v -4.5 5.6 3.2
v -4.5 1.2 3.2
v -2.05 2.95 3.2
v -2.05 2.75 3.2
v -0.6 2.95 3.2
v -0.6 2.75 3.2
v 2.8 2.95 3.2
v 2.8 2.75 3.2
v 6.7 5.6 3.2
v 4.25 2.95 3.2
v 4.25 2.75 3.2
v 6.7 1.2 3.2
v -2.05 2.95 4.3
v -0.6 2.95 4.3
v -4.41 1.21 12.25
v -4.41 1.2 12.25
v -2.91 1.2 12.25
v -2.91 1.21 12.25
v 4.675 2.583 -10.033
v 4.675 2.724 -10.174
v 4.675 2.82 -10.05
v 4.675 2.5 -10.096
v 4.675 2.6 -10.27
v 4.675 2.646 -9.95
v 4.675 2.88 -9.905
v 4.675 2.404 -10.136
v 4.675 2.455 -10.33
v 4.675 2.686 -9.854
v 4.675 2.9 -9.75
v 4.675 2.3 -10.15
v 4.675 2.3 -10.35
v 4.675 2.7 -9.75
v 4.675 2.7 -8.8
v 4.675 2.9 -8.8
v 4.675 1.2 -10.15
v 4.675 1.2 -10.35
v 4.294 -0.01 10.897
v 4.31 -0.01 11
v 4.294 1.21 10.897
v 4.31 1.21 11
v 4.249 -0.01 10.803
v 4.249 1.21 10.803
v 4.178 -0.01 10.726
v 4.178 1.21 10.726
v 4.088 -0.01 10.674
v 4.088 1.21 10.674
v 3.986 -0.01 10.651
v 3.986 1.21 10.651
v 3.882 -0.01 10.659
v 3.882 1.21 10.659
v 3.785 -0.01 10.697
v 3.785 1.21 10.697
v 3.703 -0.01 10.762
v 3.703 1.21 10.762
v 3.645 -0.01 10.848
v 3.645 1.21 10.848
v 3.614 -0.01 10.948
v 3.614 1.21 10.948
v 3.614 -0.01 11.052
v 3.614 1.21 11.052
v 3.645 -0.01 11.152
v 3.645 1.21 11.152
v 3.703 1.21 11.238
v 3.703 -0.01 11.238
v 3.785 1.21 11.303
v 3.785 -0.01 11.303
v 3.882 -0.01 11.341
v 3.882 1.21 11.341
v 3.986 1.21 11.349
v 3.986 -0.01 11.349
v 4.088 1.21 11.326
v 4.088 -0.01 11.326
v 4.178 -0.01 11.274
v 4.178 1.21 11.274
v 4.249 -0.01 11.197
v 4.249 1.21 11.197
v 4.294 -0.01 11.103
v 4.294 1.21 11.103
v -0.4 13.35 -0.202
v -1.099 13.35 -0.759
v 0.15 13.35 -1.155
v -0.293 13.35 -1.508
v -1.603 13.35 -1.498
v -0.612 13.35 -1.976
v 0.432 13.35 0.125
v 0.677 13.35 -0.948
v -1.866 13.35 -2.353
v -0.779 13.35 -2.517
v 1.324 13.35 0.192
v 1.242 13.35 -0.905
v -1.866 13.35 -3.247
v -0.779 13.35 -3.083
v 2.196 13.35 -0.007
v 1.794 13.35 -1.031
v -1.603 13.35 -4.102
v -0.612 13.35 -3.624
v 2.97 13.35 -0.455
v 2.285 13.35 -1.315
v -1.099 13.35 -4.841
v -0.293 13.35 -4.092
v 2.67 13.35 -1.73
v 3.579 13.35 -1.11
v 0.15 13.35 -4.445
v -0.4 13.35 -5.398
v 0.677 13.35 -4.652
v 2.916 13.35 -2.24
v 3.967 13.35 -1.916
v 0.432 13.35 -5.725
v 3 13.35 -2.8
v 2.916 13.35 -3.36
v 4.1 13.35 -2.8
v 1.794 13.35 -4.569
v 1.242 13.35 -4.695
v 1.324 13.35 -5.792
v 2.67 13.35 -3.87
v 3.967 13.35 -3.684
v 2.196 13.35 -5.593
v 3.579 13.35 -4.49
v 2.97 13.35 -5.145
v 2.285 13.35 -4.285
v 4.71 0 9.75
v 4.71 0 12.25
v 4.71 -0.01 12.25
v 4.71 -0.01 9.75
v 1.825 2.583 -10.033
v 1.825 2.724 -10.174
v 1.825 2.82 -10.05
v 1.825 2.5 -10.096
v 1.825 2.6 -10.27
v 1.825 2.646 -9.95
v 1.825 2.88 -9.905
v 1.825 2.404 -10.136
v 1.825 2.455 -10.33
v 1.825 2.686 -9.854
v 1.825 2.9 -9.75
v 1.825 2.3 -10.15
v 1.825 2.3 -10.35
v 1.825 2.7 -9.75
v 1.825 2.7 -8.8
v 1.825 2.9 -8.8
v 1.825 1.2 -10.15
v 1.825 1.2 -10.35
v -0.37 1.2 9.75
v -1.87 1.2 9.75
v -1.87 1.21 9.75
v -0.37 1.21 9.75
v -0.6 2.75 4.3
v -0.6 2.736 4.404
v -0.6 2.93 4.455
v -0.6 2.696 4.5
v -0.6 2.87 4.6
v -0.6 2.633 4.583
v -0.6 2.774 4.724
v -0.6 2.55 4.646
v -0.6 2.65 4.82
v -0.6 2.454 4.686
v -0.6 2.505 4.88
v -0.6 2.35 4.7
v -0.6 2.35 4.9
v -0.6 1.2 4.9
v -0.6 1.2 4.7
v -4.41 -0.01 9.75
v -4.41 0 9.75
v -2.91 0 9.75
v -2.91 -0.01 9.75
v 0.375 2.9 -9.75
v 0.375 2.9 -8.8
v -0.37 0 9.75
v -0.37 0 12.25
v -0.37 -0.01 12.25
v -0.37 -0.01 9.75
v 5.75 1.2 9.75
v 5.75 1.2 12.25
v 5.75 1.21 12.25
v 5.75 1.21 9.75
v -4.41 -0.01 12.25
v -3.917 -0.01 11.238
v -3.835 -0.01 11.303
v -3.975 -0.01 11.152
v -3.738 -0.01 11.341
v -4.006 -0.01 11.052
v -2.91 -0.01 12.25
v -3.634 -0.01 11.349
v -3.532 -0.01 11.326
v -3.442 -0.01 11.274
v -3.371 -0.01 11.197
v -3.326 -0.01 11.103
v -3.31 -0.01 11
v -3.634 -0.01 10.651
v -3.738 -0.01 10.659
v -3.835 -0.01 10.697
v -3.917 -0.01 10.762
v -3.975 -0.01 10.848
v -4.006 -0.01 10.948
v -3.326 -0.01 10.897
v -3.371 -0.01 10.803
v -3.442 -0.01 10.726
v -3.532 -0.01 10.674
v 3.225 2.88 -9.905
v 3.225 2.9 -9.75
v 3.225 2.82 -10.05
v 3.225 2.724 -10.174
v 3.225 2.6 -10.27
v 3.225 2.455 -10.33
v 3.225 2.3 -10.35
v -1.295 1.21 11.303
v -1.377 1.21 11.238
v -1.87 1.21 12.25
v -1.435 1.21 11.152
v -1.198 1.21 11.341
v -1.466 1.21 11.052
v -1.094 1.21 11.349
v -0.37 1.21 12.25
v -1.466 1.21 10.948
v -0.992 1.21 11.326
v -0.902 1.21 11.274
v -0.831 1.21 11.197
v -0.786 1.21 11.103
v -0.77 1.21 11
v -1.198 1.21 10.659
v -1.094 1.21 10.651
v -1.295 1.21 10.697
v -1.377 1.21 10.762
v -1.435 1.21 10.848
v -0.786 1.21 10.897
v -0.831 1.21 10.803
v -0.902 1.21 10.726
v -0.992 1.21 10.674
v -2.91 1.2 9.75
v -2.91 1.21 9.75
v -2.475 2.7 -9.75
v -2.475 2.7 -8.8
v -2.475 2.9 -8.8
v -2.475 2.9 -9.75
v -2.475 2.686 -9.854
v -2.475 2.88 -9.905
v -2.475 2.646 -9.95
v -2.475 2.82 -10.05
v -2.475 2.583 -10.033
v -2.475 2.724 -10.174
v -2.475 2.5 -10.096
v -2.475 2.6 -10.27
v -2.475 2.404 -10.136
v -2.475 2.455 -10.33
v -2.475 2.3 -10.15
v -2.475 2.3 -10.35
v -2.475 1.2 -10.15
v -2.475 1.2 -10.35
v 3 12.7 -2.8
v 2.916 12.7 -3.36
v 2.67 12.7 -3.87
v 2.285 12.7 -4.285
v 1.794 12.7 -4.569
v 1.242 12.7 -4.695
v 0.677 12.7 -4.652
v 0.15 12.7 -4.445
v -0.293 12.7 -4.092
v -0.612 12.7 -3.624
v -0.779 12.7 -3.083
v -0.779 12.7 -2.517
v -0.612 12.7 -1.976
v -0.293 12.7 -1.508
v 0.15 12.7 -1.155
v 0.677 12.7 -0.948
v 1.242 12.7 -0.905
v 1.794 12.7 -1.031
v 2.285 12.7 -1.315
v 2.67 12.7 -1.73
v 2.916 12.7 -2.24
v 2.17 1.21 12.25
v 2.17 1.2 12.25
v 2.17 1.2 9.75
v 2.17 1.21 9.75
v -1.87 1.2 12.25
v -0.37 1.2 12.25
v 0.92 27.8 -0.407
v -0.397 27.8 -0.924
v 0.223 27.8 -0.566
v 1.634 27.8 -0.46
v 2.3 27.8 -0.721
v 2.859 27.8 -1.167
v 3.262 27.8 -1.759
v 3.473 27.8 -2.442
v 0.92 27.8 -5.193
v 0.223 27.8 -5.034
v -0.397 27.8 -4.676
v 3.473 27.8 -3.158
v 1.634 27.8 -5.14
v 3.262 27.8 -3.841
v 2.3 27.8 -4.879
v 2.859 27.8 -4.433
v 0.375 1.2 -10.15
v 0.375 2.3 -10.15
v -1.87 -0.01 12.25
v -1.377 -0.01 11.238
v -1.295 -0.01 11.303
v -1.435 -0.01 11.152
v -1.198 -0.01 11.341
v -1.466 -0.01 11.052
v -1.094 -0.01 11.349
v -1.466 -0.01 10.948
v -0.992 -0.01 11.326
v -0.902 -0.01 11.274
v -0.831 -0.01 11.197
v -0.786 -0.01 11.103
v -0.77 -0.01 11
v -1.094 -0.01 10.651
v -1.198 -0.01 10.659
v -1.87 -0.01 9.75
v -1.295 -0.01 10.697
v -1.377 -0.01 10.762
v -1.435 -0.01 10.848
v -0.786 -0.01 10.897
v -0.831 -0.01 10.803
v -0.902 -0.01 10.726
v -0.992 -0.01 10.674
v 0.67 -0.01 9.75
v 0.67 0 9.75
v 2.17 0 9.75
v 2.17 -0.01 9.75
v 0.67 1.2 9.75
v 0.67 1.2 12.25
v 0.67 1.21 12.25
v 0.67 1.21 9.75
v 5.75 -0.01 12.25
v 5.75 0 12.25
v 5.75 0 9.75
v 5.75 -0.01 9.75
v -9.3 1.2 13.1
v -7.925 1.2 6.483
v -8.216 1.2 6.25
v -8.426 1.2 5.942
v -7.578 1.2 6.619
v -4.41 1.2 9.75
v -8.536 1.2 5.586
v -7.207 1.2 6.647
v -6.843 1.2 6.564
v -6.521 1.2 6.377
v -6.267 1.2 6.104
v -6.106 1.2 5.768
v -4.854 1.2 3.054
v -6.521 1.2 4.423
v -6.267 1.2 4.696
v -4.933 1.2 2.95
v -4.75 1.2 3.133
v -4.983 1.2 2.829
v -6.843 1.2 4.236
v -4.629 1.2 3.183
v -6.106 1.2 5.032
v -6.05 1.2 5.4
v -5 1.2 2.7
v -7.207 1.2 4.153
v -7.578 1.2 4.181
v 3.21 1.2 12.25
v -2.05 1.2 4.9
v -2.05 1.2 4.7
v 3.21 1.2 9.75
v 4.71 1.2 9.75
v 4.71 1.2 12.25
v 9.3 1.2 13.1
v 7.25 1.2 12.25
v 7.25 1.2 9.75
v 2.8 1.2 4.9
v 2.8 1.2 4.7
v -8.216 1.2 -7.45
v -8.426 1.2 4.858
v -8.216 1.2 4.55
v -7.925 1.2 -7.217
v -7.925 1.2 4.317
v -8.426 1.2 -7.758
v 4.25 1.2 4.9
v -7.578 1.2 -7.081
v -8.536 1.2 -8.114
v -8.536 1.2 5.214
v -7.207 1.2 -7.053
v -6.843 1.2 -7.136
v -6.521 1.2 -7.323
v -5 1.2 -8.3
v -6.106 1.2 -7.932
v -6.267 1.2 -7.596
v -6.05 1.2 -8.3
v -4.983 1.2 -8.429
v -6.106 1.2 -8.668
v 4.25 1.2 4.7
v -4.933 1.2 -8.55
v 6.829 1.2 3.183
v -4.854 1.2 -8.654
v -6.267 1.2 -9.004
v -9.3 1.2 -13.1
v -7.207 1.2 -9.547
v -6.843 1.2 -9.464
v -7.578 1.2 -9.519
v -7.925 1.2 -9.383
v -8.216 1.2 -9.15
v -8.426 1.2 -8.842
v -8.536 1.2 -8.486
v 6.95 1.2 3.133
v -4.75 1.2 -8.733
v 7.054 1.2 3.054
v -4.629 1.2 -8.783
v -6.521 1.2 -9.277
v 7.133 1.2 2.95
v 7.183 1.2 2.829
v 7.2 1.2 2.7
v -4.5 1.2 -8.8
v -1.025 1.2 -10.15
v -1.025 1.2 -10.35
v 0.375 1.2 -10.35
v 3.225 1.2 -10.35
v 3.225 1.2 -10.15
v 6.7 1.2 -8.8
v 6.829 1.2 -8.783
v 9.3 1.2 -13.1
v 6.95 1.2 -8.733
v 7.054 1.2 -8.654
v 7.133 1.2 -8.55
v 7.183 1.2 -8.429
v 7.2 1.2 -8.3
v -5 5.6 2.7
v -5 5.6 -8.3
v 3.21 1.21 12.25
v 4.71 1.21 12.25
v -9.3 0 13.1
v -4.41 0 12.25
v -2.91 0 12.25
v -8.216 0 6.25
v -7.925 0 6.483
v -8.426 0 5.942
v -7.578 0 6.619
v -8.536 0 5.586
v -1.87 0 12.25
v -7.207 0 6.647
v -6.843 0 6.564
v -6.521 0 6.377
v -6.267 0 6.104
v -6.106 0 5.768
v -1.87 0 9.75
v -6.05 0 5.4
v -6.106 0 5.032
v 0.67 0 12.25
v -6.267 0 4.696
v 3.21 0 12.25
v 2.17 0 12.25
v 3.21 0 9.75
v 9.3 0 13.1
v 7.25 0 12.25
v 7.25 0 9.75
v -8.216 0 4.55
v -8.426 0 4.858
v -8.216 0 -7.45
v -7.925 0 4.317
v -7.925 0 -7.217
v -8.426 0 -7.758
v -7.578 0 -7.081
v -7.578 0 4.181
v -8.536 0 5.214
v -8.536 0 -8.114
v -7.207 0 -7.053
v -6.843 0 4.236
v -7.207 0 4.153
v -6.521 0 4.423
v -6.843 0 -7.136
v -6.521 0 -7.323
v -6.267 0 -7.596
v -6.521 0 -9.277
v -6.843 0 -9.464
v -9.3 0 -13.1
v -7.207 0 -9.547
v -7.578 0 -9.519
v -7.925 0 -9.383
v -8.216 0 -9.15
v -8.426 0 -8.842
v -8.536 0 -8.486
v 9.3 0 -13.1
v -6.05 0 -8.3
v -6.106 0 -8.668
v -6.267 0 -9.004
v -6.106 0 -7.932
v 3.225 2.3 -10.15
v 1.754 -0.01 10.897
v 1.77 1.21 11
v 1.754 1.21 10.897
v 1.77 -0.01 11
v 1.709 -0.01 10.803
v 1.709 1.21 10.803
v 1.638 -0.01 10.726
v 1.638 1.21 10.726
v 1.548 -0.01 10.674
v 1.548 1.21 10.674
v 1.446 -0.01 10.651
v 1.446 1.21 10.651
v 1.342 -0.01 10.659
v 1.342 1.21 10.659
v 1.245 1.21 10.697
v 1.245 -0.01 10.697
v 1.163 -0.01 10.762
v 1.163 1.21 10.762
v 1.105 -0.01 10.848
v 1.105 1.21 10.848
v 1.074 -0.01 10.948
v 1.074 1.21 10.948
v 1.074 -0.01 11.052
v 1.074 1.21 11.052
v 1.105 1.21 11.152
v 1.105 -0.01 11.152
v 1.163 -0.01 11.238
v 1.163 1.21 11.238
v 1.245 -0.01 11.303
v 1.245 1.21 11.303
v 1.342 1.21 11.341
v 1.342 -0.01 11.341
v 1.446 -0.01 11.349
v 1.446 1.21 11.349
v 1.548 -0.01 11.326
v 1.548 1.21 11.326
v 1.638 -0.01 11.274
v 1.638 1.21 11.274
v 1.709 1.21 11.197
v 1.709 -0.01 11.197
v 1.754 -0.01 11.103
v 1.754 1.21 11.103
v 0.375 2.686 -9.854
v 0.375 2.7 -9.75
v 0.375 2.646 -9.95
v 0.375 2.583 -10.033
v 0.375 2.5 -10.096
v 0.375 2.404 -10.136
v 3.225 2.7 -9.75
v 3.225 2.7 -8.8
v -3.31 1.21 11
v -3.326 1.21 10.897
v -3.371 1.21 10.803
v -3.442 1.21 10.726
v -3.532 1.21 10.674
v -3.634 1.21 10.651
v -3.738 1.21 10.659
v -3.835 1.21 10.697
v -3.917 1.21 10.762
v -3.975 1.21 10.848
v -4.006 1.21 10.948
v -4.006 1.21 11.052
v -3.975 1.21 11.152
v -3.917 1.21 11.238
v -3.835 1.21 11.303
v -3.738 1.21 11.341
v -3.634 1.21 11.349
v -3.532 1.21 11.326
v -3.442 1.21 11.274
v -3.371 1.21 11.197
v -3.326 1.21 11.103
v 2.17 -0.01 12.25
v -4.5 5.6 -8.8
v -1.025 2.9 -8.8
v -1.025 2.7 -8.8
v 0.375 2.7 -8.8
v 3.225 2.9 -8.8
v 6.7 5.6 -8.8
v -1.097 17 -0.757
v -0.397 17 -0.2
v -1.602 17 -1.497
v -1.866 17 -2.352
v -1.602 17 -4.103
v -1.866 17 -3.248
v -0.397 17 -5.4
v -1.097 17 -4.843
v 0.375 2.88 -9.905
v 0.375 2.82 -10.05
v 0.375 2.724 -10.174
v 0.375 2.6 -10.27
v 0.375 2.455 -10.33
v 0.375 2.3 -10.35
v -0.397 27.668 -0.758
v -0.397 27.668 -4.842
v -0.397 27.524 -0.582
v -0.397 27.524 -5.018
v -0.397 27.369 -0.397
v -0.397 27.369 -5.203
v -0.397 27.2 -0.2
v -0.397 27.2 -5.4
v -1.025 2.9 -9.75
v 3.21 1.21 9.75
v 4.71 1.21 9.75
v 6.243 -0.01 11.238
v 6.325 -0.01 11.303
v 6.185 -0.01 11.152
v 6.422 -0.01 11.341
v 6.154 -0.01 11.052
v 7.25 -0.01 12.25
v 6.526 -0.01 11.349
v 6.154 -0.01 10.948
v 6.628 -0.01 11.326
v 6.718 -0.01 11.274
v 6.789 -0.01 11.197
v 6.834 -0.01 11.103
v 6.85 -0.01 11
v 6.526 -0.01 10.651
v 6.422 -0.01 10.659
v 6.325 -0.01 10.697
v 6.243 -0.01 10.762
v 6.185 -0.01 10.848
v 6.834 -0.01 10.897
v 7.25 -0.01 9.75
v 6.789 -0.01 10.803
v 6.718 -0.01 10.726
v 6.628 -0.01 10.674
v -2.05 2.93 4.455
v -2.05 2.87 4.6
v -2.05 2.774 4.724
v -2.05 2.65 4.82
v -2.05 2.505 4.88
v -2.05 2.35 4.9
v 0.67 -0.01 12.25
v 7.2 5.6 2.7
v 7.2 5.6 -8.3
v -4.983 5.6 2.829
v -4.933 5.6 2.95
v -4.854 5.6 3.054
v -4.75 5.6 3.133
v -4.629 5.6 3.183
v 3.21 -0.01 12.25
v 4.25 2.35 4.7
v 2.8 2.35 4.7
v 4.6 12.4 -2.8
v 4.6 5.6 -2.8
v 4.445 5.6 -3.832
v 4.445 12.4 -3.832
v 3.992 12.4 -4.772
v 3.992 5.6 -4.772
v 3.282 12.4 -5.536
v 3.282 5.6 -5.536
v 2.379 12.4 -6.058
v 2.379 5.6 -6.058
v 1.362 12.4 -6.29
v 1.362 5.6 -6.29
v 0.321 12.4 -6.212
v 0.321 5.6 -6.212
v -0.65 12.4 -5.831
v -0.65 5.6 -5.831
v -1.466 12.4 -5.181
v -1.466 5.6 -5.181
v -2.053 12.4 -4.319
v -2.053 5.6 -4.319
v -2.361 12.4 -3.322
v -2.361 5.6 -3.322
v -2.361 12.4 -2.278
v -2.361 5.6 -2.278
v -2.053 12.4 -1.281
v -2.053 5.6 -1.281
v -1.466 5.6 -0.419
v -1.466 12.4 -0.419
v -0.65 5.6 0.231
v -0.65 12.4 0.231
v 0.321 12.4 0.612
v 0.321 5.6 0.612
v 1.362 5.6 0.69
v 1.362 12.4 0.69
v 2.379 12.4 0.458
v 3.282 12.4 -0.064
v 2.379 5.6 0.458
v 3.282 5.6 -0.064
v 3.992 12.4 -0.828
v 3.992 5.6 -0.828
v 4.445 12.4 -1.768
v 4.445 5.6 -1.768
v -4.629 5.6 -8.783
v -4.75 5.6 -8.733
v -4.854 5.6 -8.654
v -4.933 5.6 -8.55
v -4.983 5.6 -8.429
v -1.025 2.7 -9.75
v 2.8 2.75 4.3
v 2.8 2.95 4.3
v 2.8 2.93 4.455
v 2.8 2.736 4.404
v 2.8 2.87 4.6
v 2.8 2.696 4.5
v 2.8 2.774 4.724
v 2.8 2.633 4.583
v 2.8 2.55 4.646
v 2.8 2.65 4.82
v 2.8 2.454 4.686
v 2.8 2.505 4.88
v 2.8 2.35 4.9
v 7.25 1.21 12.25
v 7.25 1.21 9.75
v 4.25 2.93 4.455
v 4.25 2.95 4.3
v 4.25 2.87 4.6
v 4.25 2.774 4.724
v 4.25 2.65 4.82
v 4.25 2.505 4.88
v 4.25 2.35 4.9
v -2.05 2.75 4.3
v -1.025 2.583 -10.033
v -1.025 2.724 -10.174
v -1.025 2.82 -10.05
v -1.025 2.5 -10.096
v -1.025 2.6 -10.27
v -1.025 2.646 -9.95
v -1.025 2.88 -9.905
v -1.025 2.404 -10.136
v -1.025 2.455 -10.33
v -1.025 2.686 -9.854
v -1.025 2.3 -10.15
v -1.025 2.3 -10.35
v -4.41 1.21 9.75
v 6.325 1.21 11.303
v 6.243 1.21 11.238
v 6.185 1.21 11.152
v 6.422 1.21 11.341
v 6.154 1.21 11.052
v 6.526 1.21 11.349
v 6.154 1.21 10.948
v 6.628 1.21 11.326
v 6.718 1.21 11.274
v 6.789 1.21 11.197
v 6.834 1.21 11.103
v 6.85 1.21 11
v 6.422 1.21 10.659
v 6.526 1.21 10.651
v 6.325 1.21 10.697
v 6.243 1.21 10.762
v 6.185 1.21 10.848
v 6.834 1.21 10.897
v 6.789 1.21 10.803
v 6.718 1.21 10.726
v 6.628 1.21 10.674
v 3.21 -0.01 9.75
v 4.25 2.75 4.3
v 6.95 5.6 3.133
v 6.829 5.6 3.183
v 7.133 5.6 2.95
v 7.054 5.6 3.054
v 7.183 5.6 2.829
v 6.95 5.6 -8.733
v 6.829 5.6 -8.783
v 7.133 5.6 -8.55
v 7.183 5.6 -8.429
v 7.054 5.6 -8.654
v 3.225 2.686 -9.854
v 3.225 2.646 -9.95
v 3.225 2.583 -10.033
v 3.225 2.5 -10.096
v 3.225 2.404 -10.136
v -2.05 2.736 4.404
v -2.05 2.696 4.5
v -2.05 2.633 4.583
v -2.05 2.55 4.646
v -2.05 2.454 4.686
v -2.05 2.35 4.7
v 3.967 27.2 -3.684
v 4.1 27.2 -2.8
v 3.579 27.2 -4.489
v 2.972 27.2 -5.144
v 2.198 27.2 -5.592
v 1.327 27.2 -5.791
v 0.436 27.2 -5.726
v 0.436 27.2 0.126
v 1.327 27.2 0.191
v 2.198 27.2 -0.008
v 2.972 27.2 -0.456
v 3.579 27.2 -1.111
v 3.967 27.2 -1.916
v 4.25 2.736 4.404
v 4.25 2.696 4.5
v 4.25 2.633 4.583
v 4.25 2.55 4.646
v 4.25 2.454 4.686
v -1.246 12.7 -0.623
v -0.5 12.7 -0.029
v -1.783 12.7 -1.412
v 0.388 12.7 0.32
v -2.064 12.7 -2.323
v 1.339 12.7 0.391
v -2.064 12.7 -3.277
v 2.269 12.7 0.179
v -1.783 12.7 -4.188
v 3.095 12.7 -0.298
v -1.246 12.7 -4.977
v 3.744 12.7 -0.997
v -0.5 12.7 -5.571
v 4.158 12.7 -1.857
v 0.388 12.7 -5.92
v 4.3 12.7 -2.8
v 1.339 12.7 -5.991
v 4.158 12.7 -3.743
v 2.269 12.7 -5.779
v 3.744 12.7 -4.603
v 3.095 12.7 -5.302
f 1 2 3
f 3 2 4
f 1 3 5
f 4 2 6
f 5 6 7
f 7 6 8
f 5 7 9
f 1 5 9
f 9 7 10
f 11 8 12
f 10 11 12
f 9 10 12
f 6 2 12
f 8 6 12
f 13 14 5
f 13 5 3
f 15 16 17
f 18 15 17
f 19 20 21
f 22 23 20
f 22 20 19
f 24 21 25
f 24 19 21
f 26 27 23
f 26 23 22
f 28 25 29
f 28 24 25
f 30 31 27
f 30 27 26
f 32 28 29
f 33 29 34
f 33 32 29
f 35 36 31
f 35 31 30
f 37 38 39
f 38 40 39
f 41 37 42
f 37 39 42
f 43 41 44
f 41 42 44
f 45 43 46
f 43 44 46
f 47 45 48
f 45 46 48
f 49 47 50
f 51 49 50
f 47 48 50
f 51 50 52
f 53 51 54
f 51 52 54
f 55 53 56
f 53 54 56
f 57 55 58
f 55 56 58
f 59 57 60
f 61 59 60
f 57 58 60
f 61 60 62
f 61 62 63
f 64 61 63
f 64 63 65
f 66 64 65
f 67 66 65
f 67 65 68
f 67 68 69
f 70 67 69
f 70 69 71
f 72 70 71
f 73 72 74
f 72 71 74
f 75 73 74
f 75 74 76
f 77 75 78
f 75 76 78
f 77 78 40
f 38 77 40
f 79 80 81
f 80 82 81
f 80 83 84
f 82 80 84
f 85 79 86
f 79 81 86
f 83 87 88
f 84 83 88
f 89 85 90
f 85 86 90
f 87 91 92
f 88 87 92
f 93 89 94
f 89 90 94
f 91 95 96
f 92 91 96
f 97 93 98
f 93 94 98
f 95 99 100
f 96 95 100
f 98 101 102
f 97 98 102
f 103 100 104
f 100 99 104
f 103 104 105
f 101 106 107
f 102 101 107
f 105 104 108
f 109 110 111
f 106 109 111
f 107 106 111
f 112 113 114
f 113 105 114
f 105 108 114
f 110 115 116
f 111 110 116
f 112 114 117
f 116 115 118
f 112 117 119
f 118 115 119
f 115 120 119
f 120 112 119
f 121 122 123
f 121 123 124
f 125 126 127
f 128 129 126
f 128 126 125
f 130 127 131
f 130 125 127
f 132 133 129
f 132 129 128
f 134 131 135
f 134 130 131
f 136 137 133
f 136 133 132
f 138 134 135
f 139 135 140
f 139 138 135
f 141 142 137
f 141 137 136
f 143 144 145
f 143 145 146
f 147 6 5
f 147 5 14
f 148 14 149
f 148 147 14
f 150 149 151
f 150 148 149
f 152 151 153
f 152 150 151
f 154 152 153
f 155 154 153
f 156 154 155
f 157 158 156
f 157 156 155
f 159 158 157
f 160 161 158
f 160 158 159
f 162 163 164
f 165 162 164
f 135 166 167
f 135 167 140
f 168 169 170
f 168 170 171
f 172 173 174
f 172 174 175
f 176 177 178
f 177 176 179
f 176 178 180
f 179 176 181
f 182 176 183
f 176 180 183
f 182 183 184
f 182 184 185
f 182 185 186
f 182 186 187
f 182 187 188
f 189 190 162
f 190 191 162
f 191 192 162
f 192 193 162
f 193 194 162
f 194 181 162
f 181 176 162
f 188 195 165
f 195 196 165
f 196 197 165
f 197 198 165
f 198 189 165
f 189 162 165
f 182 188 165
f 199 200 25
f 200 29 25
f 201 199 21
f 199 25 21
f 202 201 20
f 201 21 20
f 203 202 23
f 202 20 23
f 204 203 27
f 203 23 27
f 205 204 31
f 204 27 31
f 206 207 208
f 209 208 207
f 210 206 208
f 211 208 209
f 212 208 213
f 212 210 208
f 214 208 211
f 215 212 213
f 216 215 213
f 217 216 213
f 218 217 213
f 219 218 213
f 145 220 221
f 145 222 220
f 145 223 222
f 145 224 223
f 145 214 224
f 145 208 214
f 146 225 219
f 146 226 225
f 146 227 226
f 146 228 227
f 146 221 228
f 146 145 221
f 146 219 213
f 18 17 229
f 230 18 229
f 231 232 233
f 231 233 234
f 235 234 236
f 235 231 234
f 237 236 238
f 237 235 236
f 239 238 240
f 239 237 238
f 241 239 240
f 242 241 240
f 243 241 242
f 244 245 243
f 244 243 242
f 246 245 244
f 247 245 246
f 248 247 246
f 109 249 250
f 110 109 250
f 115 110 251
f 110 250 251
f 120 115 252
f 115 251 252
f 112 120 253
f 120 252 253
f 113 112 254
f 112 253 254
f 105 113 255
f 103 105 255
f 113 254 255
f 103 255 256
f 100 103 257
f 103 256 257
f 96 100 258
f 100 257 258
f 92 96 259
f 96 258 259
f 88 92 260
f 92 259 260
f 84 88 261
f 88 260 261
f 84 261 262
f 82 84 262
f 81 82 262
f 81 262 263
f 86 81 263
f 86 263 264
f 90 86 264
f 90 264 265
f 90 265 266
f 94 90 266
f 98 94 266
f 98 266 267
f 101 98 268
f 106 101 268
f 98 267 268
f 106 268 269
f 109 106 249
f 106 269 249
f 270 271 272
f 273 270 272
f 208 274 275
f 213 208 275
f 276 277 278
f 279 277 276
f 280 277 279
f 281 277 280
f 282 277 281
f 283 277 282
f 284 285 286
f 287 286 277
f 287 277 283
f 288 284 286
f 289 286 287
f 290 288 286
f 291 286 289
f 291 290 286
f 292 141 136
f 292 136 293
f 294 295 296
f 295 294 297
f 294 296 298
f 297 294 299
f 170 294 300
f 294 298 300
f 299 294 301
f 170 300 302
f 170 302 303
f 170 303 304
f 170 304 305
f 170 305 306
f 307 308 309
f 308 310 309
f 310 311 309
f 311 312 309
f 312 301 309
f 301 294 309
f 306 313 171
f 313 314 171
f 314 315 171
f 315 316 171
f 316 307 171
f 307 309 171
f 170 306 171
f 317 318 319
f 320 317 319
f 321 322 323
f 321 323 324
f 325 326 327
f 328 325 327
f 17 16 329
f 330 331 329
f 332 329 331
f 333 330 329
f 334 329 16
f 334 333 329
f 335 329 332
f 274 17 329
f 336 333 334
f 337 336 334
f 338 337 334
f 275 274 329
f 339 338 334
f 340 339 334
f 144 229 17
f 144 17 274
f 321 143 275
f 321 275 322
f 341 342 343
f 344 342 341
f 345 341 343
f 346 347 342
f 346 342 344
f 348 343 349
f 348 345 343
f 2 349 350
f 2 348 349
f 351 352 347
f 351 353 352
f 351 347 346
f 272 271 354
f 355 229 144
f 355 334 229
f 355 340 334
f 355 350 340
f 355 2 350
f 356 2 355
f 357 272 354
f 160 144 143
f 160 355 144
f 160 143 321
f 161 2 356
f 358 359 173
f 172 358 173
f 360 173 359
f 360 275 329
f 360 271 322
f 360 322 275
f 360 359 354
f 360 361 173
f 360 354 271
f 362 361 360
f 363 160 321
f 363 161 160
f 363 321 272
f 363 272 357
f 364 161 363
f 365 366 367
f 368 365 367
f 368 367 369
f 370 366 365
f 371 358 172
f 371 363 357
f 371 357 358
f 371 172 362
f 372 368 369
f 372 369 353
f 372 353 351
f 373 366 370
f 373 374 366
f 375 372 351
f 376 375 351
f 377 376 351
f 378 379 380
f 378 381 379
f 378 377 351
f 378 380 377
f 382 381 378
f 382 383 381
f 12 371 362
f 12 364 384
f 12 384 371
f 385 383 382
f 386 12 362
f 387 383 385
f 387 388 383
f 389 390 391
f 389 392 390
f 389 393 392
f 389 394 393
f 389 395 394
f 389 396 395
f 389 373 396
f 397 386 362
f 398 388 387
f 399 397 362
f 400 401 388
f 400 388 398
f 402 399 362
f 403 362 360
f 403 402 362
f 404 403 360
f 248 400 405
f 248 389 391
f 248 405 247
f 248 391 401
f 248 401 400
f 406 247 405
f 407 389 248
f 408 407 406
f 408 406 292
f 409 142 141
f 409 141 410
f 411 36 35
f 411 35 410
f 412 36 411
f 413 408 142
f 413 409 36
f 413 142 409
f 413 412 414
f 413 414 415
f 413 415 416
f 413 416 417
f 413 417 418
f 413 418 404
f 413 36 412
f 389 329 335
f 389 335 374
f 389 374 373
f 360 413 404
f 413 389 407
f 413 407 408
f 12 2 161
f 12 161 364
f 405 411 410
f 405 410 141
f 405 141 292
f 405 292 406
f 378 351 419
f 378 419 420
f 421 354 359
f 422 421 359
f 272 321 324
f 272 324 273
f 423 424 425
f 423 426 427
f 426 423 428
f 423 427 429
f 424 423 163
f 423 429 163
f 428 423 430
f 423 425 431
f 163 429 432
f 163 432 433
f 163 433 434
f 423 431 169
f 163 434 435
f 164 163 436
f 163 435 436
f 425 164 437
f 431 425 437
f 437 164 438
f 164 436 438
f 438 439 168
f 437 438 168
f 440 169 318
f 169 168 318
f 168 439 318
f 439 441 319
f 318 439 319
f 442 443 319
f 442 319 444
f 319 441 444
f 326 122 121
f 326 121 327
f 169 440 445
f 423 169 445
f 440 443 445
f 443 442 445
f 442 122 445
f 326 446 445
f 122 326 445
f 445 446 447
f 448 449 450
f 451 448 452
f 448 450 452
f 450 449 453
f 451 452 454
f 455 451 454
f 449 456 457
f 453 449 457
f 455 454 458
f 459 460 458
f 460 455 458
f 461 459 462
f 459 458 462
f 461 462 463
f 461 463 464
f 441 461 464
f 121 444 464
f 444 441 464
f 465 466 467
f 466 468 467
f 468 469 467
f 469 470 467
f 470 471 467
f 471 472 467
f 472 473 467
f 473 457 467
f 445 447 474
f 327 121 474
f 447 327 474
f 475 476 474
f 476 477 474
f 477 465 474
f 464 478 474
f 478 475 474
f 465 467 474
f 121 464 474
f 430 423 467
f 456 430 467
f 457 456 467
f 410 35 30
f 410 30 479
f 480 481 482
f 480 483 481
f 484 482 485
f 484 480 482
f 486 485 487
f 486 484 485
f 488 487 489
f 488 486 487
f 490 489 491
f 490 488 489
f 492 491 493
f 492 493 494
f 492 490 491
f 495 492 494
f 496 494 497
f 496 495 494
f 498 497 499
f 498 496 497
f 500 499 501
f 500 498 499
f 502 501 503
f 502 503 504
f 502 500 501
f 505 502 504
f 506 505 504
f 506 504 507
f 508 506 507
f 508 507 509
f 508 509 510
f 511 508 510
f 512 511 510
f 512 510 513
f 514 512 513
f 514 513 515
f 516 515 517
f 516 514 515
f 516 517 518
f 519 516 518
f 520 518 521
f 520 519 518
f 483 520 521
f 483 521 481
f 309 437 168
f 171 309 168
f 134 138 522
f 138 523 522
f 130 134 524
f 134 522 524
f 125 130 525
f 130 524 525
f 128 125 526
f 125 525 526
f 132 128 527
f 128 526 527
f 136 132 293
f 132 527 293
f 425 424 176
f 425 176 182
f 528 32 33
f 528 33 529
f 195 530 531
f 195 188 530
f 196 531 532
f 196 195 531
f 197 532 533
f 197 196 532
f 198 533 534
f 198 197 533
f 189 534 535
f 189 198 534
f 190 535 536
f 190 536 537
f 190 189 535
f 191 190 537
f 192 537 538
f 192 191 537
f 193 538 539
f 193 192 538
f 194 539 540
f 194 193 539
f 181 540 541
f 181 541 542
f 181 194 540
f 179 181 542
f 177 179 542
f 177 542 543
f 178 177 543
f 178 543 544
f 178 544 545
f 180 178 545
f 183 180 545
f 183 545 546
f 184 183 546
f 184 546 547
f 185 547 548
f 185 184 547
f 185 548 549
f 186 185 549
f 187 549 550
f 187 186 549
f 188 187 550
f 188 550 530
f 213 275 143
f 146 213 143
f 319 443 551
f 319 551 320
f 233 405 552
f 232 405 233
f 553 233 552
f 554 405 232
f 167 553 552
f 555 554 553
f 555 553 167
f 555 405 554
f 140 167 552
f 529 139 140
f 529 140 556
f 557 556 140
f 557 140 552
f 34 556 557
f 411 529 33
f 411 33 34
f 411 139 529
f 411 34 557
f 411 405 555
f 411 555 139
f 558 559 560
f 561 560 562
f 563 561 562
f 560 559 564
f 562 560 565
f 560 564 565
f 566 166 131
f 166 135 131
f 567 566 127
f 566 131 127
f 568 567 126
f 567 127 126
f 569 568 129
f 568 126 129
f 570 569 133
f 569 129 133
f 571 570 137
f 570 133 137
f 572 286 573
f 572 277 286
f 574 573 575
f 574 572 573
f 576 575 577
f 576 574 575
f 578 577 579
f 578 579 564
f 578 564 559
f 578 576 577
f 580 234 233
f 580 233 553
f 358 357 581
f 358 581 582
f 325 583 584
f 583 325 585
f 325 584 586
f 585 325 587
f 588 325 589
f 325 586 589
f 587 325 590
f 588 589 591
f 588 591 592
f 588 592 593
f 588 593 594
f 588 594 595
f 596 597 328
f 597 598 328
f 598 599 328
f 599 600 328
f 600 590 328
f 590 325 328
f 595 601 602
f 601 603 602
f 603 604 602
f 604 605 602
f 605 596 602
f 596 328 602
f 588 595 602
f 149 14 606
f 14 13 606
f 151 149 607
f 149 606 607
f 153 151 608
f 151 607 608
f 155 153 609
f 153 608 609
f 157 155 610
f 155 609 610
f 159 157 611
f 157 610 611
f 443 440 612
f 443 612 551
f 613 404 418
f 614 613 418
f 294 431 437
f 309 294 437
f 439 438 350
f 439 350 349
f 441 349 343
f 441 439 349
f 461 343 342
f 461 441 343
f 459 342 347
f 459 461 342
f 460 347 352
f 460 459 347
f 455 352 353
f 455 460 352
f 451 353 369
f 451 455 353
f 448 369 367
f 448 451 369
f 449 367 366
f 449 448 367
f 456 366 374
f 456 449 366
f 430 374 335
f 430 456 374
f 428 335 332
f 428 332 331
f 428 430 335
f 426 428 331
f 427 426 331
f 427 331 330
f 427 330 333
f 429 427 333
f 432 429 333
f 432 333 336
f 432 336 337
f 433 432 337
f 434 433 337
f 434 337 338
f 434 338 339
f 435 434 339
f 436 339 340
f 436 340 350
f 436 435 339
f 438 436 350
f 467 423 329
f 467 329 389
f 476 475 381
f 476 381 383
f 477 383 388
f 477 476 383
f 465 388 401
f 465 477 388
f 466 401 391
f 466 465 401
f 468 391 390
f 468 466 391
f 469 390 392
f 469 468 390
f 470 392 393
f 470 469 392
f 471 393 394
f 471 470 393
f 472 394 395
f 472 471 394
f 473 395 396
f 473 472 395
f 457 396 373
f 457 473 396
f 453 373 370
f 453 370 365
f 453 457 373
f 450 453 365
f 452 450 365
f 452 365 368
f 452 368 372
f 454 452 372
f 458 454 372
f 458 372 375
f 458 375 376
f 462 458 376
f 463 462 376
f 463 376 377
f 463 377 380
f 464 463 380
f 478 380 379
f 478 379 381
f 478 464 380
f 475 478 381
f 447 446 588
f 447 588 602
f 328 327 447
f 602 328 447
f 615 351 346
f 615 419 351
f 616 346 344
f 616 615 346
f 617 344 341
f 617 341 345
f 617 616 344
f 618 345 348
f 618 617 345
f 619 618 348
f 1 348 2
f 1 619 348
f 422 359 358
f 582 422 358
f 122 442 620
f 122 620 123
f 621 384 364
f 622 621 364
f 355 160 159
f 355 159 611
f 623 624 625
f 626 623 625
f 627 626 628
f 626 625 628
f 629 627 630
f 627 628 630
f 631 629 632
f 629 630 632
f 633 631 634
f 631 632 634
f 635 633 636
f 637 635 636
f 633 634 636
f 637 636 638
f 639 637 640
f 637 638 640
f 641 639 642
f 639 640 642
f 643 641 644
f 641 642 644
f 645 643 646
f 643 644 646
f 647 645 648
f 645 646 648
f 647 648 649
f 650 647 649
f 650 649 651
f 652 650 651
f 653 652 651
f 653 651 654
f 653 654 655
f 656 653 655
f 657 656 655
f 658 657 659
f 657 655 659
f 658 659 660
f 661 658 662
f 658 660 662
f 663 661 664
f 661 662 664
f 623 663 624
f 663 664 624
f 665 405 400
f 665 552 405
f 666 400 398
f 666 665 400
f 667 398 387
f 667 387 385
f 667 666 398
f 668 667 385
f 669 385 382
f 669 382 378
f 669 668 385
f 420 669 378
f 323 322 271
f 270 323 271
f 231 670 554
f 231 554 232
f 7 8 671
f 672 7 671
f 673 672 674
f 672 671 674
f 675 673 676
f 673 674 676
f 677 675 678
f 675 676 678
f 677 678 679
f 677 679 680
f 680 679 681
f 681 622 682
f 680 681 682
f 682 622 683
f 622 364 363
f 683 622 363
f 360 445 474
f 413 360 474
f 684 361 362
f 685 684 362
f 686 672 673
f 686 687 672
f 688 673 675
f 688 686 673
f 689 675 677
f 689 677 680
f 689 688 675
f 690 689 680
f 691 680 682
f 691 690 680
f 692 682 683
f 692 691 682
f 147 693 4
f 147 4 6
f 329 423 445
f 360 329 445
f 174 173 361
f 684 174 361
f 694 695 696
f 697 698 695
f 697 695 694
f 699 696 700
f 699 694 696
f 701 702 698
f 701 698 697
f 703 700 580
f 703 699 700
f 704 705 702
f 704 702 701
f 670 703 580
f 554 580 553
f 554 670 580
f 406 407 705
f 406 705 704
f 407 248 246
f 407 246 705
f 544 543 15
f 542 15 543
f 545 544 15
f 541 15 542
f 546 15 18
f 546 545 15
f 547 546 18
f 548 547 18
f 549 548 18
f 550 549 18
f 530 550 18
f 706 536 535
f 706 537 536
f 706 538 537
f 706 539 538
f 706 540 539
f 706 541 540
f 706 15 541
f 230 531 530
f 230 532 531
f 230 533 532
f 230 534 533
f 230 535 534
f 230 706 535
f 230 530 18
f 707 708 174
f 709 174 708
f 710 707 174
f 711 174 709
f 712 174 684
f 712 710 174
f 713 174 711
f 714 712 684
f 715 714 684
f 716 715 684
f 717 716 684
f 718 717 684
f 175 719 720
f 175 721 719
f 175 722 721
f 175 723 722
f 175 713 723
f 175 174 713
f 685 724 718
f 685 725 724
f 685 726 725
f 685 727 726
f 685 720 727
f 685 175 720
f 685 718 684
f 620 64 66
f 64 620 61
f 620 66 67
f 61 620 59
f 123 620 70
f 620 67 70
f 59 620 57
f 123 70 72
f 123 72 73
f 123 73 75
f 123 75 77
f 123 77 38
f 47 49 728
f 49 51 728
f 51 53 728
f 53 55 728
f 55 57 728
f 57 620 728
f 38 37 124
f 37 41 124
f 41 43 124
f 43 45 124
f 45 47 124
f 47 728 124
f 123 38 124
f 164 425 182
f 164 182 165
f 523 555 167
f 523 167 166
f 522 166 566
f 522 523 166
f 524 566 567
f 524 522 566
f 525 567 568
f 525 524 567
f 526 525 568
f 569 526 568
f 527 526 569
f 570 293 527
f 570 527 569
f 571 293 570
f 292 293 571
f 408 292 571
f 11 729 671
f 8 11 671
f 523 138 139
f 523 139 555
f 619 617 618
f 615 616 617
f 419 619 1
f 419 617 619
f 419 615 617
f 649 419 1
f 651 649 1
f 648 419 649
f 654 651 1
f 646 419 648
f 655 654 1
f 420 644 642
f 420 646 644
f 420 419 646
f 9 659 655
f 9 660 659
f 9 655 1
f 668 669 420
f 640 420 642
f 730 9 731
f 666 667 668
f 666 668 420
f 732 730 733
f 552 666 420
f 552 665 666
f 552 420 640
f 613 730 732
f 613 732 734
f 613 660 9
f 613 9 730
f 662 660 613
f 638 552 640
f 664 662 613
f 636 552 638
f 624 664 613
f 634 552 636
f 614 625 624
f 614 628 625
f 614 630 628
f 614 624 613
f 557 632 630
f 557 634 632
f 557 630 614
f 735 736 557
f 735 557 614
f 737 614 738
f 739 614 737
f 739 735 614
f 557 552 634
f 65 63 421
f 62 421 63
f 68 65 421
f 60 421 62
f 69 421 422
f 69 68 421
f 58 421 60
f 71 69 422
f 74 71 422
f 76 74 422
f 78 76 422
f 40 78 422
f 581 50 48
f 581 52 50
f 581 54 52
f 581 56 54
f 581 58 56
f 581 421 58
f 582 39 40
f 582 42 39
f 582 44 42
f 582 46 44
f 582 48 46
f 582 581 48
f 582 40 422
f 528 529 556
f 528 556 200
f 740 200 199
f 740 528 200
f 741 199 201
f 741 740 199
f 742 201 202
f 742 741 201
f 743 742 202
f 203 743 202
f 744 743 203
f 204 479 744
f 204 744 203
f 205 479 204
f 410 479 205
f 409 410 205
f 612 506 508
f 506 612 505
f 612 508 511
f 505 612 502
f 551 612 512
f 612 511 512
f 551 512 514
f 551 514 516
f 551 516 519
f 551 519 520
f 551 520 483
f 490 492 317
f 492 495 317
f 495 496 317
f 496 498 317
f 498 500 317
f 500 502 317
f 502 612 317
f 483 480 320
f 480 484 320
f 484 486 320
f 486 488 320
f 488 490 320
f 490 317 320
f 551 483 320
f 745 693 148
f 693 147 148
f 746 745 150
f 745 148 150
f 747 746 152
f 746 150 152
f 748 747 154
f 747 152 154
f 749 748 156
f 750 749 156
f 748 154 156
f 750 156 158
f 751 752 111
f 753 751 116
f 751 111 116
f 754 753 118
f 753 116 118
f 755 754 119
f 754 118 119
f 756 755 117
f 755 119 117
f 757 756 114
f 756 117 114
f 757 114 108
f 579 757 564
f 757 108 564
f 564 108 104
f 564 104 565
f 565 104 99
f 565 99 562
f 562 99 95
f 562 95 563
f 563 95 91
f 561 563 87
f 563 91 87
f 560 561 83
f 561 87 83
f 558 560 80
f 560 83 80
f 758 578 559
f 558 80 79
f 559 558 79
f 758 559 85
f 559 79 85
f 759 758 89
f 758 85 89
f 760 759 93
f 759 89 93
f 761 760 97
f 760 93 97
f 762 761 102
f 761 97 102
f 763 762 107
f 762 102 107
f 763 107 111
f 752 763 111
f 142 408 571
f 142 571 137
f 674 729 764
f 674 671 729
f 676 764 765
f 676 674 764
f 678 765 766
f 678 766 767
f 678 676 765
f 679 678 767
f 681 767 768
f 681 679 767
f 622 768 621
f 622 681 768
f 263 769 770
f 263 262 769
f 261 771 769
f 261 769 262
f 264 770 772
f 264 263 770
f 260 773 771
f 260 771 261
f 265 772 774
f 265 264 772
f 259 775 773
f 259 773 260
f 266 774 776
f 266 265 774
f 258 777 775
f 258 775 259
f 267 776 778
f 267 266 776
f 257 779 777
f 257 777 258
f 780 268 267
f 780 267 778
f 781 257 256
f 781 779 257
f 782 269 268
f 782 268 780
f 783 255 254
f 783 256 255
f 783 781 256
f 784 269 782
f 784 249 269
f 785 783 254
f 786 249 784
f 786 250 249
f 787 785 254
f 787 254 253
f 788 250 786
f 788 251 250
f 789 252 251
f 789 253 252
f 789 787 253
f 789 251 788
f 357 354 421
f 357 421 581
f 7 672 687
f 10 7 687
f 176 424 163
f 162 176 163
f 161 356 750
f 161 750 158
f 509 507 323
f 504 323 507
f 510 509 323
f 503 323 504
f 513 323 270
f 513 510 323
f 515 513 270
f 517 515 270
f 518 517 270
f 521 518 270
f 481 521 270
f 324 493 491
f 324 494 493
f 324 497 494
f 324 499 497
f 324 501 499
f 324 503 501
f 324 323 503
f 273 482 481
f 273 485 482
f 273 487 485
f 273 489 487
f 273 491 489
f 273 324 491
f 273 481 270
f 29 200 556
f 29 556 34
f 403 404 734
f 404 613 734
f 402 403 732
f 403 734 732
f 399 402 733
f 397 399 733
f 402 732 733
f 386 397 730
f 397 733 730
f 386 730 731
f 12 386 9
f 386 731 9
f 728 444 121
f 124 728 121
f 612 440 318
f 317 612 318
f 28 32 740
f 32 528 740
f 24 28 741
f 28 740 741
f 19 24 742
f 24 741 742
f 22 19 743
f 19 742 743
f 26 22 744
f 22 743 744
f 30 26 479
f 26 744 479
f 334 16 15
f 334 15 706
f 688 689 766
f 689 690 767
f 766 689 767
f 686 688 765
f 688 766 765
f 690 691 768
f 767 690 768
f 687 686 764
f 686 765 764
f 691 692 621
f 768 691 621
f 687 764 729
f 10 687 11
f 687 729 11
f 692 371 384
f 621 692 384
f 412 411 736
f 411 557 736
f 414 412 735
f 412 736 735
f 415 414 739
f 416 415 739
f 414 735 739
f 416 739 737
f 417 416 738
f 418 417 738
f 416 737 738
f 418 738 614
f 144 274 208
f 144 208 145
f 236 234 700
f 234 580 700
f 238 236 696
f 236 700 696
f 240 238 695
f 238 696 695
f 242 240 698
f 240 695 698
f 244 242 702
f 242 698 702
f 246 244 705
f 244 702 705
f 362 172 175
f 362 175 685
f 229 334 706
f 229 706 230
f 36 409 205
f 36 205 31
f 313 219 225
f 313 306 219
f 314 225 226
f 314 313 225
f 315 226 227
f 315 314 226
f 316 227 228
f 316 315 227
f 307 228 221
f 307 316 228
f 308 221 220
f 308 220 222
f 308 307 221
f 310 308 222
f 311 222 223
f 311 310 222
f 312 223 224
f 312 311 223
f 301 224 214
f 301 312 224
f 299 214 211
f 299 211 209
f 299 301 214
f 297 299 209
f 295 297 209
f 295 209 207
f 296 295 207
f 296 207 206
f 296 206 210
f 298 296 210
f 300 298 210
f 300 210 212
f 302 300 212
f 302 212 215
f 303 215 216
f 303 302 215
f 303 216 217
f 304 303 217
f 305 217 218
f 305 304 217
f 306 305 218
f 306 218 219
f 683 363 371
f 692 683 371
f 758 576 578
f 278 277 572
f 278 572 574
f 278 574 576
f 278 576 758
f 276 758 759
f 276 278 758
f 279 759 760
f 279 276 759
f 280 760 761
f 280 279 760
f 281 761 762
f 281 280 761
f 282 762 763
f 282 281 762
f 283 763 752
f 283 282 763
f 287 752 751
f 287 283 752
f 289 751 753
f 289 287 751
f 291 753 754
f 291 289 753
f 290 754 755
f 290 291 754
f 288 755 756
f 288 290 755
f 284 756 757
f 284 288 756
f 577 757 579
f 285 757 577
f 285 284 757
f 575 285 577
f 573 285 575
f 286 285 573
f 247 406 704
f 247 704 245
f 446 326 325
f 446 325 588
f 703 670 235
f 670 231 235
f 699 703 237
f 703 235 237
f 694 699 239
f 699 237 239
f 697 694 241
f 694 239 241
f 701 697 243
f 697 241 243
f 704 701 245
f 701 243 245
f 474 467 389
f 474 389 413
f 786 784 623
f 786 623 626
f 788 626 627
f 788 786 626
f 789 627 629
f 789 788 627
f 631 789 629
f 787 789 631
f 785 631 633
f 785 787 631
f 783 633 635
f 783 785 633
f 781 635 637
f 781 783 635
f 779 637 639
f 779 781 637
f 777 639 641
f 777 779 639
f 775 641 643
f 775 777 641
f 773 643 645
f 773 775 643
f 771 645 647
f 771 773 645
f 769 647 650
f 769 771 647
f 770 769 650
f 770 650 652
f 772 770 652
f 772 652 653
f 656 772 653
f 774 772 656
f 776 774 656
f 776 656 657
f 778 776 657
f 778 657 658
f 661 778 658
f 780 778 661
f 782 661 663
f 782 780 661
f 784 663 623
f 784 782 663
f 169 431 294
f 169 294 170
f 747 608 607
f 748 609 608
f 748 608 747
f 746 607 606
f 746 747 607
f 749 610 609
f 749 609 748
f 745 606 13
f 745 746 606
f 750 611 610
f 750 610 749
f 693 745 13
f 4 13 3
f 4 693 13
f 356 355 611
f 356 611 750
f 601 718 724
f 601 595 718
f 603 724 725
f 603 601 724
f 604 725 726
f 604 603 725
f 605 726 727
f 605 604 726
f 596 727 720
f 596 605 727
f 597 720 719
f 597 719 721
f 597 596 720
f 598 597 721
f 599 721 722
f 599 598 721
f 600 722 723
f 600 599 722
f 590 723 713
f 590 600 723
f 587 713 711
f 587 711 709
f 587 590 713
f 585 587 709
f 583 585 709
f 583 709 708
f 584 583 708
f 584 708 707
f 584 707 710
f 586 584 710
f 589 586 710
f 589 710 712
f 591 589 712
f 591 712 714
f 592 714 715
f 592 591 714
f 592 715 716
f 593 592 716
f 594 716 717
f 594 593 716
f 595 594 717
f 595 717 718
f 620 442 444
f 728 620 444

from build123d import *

# Parameters (mm, degrees)
SKETCH1_W           = 18.6
SKETCH1_H           = 26.2
SKETCH1_R           = 1.25
BOSS_EXTRUDE1_DEPTH = 1.2
SKETCH3_W           = 12.2
SKETCH3_H           = 12
BOSS_EXTRUDE2_DEPTH = 4.4
SKETCH10_W          = 1.45
SKETCH10_H          = 0.2
SKETCH13_W          = 1.45
SKETCH13_H          = 0.2
LPATTERN1_COUNT     = 2
LPATTERN1_PITCH     = 2.85
LPATTERN2_COUNT     = 2
LPATTERN2_PITCH     = 2.85
SKETCH14_R          = 3.5
BOSS_EXTRUDE4_DEPTH = 7.1
CHAMFER1_SIZE       = 0.3
SKETCH15_R          = 1.9
BOSS_EXTRUDE5_DEPTH = 0.65
SKETCH16_R          = 3
BOSS_EXTRUDE6_DEPTH = 14.45
CHAMFER2_SIZE       = 0.6
CUT_EXTRUDE1_DEPTH  = 10.8
SKETCH18_R          = 0.35
CUT_EXTRUDE2_DEPTH  = 1.2
SKETCH19_W          = 1.5
SKETCH19_H          = 2.5
SKETCH19_R          = 0.35
BOSS_EXTRUDE7_DEPTH = 0.01
FILLET1_R           = 0.5


with BuildPart() as part:
    # Sketch1 → Boss-Extrude1 (new body)
    with BuildSketch(Plane(origin=(0, 0, 0), x_dir=(1, 0, 0), z_dir=(0, 1, 0))):
        Rectangle(SKETCH1_W, SKETCH1_H)
        with Locations((-7.3, 8.3)):
            Circle(SKETCH1_R, mode=Mode.SUBTRACT)
        with Locations((-7.3, -5.4)):
            Circle(SKETCH1_R, mode=Mode.SUBTRACT)
    extrude(amount=BOSS_EXTRUDE1_DEPTH)

    # Sketch3 → Boss-Extrude2 (add)
    with BuildSketch(Plane(origin=(0, 1.2, 0), x_dir=(1, 0, 0), z_dir=(0, 1, 0))):
        with Locations((1.1, 2.8)):
            Rectangle(SKETCH3_W, SKETCH3_H)
    extrude(amount=BOSS_EXTRUDE2_DEPTH)

    # Sweep3: sweep along a curve in space
    with BuildLine() as sweep3_path:
        Line((-1.325, 2.85, 3.2), (-1.325, 2.85, 4.3))
        ThreePointArc((-1.325, 2.85, 4.3), (-1.325, 2.703553391, 4.653553391), (-1.325, 2.35, 4.8))
        Line((-1.325, 2.35, 4.8), (-1.325, 1.2, 4.8))
    # Sketch10 → Sweep3 (sweep)
    with BuildSketch(Plane.XY.offset(3.2)):
        with Locations((-1.325, 2.85)):
            Rectangle(SKETCH10_W, SKETCH10_H)
    sweep3 = sweep(path=sweep3_path.line)

    # Mirror2: Sweep3 across plane
    add(sweep3.mirror(Plane.ZY.offset(-1.1)))

    # Sweep4: sweep along a curve in space
    with BuildLine() as sweep4_path:
        Line((1.1, 2.8, -8.8), (1.1, 2.8, -9.75))
        ThreePointArc((1.1, 2.8, -9.75), (1.1, 2.653553391, -10.103553391), (1.1, 2.3, -10.25))
        Line((1.1, 2.3, -10.25), (1.1, 1.2, -10.25))
    # Sketch13 → Sweep4 (sweep)
    with BuildSketch(Plane(origin=(0, 0, -8.8), x_dir=(-1, 0, 0), z_dir=(0, 0, -1))):
        with Locations((-1.1, 2.8)):
            Rectangle(SKETCH13_W, SKETCH13_H)
    sweep4 = sweep(path=sweep4_path.line)

    # LPattern1: Sweep4 ×2
    with Locations(*[(-i * LPATTERN1_PITCH, 0, 0) for i in range(1, LPATTERN1_COUNT)]):
        add(sweep4)

    # LPattern2: Sweep4 ×2
    with Locations(*[(i * LPATTERN2_PITCH, 0, 0) for i in range(1, LPATTERN2_COUNT)]):
        add(sweep4)

    # Sketch14 → Boss-Extrude4 (add)
    with BuildSketch(Plane(origin=(0, 5.6, 0), x_dir=(1, 0, 0), z_dir=(0, 1, 0))):
        with Locations((1.1, 2.8)):
            Circle(SKETCH14_R)
    extrude(amount=BOSS_EXTRUDE4_DEPTH)

    # Chamfer1
    chamfer1_edges = [part.edges().sort_by_distance(p)[0] for p in [
        (-2.4, 12.7, -2.8),
    ]]
    chamfer(chamfer1_edges, length=CHAMFER1_SIZE)

    # Sketch15 → Boss-Extrude5 (add)
    with BuildSketch(Plane(origin=(0, 12.7, 0), x_dir=(1, 0, 0), z_dir=(0, 1, 0))):
        with Locations((1.1, 2.8)):
            Circle(SKETCH15_R)
    extrude(amount=BOSS_EXTRUDE5_DEPTH)

    # Sketch16 → Boss-Extrude6 (add)
    with BuildSketch(Plane(origin=(0, 13.35, 0), x_dir=(1, 0, 0), z_dir=(0, 1, 0))):
        with Locations((1.1, 2.8)):
            Circle(SKETCH16_R)
    extrude(amount=BOSS_EXTRUDE6_DEPTH)

    # Chamfer2
    chamfer2_edges = [part.edges().sort_by_distance(p)[0] for p in [
        (-1.9, 27.8, -2.8),
    ]]
    chamfer(chamfer2_edges, length=CHAMFER2_SIZE)

    # Sketch17 → Cut-Extrude1 (cut)
    with BuildSketch(Plane(origin=(0, 27.8, 0), x_dir=(1, 0, 0), z_dir=(0, 1, 0))):
        with BuildLine():
            Line((-0.396662955, 5.4), (-0.396662955, 0.2))
            ThreePointArc((-0.396662955, 0.2), (-1.9, 2.8), (-0.396662955, 5.4))
        make_face()
    extrude(amount=-CUT_EXTRUDE1_DEPTH, mode=Mode.SUBTRACT)

    # Sketch18 → Cut-Extrude2 (cut)
    with BuildSketch(Plane(origin=(0, 1.2, 0), x_dir=(1, 0, 0), z_dir=(0, 1, 0))):
        with Locations((6.5, -11)):
            Circle(SKETCH18_R)
        with Locations((3.96, -11)):
            Circle(SKETCH18_R)
        with Locations((1.42, -11)):
            Circle(SKETCH18_R)
        with Locations((-1.12, -11)):
            Circle(SKETCH18_R)
        with Locations((-3.66, -11)):
            Circle(SKETCH18_R)
    extrude(amount=-CUT_EXTRUDE2_DEPTH, mode=Mode.SUBTRACT)

    # Sketch19 → Boss-Extrude7 (add)
    with BuildSketch(Plane(origin=(0, 1.2, 0), x_dir=(1, 0, 0), z_dir=(0, 1, 0))):
        with Locations((3.96, -11)):
            Rectangle(SKETCH19_W, SKETCH19_H)
        with Locations((3.96, -11)):
            Circle(SKETCH19_R, mode=Mode.SUBTRACT)
        with Locations((6.5, -11)):
            Rectangle(SKETCH19_W, SKETCH19_H)
        with Locations((6.5, -11)):
            Circle(SKETCH19_R, mode=Mode.SUBTRACT)
        with Locations((1.42, -11)):
            Rectangle(SKETCH19_W, SKETCH19_H)
        with Locations((1.42, -11)):
            Circle(SKETCH19_R, mode=Mode.SUBTRACT)
        with Locations((-1.12, -11)):
            Rectangle(SKETCH19_W, SKETCH19_H)
        with Locations((-1.12, -11)):
            Circle(SKETCH19_R, mode=Mode.SUBTRACT)
        with Locations((-3.66, -11)):
            Rectangle(SKETCH19_W, SKETCH19_H)
        with Locations((-3.66, -11)):
            Circle(SKETCH19_R, mode=Mode.SUBTRACT)
    boss_extrude7 = extrude(amount=BOSS_EXTRUDE7_DEPTH)

    # Mirror3: Boss-Extrude7 across plane
    add(boss_extrude7.mirror(Plane.ZX.offset(0.6)))

    # Fillet1
    fillet1_edges = [part.edges().sort_by_distance(p)[0] for p in [
        (7.2, 3.4, 3.2),
        (7.2, 3.4, -8.8),
        (-5, 3.4, -8.8),
        (-5, 3.4, 3.2),
    ]]
    fillet(fillet1_edges, radius=FILLET1_R)


solid = part.part
